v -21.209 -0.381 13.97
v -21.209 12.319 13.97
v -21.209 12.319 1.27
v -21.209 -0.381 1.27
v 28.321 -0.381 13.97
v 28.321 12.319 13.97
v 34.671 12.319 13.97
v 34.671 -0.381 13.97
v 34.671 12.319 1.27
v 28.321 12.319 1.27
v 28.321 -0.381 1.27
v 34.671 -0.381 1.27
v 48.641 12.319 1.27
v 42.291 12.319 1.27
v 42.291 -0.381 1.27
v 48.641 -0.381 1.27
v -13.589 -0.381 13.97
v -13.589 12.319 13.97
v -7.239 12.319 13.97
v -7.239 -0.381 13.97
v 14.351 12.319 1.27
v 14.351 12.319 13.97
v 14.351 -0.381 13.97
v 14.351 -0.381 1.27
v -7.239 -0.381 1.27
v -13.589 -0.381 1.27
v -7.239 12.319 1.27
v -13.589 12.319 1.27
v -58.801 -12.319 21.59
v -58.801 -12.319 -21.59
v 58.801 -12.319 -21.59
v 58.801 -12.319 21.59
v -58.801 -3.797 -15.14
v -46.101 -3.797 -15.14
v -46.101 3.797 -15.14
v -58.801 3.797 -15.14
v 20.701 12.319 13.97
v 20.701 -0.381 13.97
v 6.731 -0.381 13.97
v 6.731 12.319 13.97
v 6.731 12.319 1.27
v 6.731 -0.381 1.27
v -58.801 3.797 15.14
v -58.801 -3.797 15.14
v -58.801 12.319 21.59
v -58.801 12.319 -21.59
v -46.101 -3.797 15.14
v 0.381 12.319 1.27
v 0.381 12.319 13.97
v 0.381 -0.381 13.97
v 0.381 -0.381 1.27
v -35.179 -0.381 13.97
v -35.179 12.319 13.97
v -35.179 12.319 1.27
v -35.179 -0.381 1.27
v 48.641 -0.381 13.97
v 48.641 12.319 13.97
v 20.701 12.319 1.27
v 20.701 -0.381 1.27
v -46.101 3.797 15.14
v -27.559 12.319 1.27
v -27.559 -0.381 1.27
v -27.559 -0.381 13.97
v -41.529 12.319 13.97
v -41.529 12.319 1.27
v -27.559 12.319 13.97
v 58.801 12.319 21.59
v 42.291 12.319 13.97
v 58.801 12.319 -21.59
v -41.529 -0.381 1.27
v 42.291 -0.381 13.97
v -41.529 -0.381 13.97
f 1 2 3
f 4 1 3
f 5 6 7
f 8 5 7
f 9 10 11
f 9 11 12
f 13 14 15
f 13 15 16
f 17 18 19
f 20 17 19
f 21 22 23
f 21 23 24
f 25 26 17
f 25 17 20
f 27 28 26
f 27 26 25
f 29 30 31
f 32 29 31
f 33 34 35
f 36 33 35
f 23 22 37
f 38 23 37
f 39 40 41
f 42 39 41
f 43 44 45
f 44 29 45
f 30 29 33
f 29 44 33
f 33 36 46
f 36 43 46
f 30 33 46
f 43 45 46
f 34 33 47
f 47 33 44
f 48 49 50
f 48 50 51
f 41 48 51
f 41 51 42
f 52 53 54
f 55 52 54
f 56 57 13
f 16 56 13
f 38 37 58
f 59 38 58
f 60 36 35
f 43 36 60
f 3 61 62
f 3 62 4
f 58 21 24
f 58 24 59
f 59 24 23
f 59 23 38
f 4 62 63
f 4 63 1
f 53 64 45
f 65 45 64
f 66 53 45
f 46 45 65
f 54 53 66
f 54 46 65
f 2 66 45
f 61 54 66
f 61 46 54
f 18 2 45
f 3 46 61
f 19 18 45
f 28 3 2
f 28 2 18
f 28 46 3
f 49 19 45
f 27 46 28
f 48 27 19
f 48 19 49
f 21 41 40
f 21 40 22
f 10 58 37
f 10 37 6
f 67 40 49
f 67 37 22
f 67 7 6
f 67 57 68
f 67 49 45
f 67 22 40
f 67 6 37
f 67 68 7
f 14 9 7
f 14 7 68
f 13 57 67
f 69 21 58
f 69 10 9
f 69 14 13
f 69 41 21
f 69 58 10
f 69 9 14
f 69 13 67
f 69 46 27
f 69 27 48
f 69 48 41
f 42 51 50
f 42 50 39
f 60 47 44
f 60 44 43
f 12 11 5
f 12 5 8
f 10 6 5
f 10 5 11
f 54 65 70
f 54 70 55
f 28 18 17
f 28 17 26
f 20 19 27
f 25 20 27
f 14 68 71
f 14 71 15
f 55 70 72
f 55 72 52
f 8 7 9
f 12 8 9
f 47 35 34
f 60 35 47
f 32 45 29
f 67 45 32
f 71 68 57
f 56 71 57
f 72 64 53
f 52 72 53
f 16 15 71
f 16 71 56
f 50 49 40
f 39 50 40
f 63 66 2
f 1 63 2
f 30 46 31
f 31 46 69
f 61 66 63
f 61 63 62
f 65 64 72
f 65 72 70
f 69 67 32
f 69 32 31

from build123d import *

# Parameters (mm, degrees)
SKETCH1_W           = 117.602
SKETCH1_H           = 43.18
BOSS_EXTRUDE1_DEPTH = 12.319
SKETCH2_W           = 6.35
SKETCH2_H           = 12.7
CUT_EXTRUDE1_DEPTH  = 12.7
SKETCH3_W           = 30.280505476
SKETCH3_H           = 7.594186668
CUT_EXTRUDE2_DEPTH  = 12.7


with BuildPart() as part:
    # Sketch1 → Boss-Extrude1 (new, symmetric)
    with BuildSketch(Plane(origin=(0, 0, 0), x_dir=(1, 0, 0), z_dir=(0, 1, 0))):
        Rectangle(SKETCH1_W, SKETCH1_H)
    extrude(amount=BOSS_EXTRUDE1_DEPTH, both=True)

    # Sketch2 → Cut-Extrude1 (cut)
    with BuildSketch(Plane(origin=(0, 12.319, 0), x_dir=(1, 0, 0), z_dir=(0, 1, 0))):
        with Locations((45.466, -7.62)):
            Rectangle(SKETCH2_W, SKETCH2_H)
        with Locations((31.496, -7.62)):
            Rectangle(SKETCH2_W, SKETCH2_H)
        with Locations((17.526, -7.62)):
            Rectangle(SKETCH2_W, SKETCH2_H)
        with Locations((3.556, -7.62)):
            Rectangle(SKETCH2_W, SKETCH2_H)
        with Locations((-10.414, -7.62)):
            Rectangle(SKETCH2_W, SKETCH2_H)
        with Locations((-24.384, -7.62)):
            Rectangle(SKETCH2_W, SKETCH2_H)
        with Locations((-38.354, -7.62)):
            Rectangle(SKETCH2_W, SKETCH2_H)
    extrude(amount=-CUT_EXTRUDE1_DEPTH, mode=Mode.SUBTRACT)

    # Sketch3 → Cut-Extrude2 (cut)
    with BuildSketch(Plane.ZY.offset(58.801)):
        Rectangle(SKETCH3_W, SKETCH3_H)
    extrude(amount=-CUT_EXTRUDE2_DEPTH, mode=Mode.SUBTRACT)


solid = part.part
